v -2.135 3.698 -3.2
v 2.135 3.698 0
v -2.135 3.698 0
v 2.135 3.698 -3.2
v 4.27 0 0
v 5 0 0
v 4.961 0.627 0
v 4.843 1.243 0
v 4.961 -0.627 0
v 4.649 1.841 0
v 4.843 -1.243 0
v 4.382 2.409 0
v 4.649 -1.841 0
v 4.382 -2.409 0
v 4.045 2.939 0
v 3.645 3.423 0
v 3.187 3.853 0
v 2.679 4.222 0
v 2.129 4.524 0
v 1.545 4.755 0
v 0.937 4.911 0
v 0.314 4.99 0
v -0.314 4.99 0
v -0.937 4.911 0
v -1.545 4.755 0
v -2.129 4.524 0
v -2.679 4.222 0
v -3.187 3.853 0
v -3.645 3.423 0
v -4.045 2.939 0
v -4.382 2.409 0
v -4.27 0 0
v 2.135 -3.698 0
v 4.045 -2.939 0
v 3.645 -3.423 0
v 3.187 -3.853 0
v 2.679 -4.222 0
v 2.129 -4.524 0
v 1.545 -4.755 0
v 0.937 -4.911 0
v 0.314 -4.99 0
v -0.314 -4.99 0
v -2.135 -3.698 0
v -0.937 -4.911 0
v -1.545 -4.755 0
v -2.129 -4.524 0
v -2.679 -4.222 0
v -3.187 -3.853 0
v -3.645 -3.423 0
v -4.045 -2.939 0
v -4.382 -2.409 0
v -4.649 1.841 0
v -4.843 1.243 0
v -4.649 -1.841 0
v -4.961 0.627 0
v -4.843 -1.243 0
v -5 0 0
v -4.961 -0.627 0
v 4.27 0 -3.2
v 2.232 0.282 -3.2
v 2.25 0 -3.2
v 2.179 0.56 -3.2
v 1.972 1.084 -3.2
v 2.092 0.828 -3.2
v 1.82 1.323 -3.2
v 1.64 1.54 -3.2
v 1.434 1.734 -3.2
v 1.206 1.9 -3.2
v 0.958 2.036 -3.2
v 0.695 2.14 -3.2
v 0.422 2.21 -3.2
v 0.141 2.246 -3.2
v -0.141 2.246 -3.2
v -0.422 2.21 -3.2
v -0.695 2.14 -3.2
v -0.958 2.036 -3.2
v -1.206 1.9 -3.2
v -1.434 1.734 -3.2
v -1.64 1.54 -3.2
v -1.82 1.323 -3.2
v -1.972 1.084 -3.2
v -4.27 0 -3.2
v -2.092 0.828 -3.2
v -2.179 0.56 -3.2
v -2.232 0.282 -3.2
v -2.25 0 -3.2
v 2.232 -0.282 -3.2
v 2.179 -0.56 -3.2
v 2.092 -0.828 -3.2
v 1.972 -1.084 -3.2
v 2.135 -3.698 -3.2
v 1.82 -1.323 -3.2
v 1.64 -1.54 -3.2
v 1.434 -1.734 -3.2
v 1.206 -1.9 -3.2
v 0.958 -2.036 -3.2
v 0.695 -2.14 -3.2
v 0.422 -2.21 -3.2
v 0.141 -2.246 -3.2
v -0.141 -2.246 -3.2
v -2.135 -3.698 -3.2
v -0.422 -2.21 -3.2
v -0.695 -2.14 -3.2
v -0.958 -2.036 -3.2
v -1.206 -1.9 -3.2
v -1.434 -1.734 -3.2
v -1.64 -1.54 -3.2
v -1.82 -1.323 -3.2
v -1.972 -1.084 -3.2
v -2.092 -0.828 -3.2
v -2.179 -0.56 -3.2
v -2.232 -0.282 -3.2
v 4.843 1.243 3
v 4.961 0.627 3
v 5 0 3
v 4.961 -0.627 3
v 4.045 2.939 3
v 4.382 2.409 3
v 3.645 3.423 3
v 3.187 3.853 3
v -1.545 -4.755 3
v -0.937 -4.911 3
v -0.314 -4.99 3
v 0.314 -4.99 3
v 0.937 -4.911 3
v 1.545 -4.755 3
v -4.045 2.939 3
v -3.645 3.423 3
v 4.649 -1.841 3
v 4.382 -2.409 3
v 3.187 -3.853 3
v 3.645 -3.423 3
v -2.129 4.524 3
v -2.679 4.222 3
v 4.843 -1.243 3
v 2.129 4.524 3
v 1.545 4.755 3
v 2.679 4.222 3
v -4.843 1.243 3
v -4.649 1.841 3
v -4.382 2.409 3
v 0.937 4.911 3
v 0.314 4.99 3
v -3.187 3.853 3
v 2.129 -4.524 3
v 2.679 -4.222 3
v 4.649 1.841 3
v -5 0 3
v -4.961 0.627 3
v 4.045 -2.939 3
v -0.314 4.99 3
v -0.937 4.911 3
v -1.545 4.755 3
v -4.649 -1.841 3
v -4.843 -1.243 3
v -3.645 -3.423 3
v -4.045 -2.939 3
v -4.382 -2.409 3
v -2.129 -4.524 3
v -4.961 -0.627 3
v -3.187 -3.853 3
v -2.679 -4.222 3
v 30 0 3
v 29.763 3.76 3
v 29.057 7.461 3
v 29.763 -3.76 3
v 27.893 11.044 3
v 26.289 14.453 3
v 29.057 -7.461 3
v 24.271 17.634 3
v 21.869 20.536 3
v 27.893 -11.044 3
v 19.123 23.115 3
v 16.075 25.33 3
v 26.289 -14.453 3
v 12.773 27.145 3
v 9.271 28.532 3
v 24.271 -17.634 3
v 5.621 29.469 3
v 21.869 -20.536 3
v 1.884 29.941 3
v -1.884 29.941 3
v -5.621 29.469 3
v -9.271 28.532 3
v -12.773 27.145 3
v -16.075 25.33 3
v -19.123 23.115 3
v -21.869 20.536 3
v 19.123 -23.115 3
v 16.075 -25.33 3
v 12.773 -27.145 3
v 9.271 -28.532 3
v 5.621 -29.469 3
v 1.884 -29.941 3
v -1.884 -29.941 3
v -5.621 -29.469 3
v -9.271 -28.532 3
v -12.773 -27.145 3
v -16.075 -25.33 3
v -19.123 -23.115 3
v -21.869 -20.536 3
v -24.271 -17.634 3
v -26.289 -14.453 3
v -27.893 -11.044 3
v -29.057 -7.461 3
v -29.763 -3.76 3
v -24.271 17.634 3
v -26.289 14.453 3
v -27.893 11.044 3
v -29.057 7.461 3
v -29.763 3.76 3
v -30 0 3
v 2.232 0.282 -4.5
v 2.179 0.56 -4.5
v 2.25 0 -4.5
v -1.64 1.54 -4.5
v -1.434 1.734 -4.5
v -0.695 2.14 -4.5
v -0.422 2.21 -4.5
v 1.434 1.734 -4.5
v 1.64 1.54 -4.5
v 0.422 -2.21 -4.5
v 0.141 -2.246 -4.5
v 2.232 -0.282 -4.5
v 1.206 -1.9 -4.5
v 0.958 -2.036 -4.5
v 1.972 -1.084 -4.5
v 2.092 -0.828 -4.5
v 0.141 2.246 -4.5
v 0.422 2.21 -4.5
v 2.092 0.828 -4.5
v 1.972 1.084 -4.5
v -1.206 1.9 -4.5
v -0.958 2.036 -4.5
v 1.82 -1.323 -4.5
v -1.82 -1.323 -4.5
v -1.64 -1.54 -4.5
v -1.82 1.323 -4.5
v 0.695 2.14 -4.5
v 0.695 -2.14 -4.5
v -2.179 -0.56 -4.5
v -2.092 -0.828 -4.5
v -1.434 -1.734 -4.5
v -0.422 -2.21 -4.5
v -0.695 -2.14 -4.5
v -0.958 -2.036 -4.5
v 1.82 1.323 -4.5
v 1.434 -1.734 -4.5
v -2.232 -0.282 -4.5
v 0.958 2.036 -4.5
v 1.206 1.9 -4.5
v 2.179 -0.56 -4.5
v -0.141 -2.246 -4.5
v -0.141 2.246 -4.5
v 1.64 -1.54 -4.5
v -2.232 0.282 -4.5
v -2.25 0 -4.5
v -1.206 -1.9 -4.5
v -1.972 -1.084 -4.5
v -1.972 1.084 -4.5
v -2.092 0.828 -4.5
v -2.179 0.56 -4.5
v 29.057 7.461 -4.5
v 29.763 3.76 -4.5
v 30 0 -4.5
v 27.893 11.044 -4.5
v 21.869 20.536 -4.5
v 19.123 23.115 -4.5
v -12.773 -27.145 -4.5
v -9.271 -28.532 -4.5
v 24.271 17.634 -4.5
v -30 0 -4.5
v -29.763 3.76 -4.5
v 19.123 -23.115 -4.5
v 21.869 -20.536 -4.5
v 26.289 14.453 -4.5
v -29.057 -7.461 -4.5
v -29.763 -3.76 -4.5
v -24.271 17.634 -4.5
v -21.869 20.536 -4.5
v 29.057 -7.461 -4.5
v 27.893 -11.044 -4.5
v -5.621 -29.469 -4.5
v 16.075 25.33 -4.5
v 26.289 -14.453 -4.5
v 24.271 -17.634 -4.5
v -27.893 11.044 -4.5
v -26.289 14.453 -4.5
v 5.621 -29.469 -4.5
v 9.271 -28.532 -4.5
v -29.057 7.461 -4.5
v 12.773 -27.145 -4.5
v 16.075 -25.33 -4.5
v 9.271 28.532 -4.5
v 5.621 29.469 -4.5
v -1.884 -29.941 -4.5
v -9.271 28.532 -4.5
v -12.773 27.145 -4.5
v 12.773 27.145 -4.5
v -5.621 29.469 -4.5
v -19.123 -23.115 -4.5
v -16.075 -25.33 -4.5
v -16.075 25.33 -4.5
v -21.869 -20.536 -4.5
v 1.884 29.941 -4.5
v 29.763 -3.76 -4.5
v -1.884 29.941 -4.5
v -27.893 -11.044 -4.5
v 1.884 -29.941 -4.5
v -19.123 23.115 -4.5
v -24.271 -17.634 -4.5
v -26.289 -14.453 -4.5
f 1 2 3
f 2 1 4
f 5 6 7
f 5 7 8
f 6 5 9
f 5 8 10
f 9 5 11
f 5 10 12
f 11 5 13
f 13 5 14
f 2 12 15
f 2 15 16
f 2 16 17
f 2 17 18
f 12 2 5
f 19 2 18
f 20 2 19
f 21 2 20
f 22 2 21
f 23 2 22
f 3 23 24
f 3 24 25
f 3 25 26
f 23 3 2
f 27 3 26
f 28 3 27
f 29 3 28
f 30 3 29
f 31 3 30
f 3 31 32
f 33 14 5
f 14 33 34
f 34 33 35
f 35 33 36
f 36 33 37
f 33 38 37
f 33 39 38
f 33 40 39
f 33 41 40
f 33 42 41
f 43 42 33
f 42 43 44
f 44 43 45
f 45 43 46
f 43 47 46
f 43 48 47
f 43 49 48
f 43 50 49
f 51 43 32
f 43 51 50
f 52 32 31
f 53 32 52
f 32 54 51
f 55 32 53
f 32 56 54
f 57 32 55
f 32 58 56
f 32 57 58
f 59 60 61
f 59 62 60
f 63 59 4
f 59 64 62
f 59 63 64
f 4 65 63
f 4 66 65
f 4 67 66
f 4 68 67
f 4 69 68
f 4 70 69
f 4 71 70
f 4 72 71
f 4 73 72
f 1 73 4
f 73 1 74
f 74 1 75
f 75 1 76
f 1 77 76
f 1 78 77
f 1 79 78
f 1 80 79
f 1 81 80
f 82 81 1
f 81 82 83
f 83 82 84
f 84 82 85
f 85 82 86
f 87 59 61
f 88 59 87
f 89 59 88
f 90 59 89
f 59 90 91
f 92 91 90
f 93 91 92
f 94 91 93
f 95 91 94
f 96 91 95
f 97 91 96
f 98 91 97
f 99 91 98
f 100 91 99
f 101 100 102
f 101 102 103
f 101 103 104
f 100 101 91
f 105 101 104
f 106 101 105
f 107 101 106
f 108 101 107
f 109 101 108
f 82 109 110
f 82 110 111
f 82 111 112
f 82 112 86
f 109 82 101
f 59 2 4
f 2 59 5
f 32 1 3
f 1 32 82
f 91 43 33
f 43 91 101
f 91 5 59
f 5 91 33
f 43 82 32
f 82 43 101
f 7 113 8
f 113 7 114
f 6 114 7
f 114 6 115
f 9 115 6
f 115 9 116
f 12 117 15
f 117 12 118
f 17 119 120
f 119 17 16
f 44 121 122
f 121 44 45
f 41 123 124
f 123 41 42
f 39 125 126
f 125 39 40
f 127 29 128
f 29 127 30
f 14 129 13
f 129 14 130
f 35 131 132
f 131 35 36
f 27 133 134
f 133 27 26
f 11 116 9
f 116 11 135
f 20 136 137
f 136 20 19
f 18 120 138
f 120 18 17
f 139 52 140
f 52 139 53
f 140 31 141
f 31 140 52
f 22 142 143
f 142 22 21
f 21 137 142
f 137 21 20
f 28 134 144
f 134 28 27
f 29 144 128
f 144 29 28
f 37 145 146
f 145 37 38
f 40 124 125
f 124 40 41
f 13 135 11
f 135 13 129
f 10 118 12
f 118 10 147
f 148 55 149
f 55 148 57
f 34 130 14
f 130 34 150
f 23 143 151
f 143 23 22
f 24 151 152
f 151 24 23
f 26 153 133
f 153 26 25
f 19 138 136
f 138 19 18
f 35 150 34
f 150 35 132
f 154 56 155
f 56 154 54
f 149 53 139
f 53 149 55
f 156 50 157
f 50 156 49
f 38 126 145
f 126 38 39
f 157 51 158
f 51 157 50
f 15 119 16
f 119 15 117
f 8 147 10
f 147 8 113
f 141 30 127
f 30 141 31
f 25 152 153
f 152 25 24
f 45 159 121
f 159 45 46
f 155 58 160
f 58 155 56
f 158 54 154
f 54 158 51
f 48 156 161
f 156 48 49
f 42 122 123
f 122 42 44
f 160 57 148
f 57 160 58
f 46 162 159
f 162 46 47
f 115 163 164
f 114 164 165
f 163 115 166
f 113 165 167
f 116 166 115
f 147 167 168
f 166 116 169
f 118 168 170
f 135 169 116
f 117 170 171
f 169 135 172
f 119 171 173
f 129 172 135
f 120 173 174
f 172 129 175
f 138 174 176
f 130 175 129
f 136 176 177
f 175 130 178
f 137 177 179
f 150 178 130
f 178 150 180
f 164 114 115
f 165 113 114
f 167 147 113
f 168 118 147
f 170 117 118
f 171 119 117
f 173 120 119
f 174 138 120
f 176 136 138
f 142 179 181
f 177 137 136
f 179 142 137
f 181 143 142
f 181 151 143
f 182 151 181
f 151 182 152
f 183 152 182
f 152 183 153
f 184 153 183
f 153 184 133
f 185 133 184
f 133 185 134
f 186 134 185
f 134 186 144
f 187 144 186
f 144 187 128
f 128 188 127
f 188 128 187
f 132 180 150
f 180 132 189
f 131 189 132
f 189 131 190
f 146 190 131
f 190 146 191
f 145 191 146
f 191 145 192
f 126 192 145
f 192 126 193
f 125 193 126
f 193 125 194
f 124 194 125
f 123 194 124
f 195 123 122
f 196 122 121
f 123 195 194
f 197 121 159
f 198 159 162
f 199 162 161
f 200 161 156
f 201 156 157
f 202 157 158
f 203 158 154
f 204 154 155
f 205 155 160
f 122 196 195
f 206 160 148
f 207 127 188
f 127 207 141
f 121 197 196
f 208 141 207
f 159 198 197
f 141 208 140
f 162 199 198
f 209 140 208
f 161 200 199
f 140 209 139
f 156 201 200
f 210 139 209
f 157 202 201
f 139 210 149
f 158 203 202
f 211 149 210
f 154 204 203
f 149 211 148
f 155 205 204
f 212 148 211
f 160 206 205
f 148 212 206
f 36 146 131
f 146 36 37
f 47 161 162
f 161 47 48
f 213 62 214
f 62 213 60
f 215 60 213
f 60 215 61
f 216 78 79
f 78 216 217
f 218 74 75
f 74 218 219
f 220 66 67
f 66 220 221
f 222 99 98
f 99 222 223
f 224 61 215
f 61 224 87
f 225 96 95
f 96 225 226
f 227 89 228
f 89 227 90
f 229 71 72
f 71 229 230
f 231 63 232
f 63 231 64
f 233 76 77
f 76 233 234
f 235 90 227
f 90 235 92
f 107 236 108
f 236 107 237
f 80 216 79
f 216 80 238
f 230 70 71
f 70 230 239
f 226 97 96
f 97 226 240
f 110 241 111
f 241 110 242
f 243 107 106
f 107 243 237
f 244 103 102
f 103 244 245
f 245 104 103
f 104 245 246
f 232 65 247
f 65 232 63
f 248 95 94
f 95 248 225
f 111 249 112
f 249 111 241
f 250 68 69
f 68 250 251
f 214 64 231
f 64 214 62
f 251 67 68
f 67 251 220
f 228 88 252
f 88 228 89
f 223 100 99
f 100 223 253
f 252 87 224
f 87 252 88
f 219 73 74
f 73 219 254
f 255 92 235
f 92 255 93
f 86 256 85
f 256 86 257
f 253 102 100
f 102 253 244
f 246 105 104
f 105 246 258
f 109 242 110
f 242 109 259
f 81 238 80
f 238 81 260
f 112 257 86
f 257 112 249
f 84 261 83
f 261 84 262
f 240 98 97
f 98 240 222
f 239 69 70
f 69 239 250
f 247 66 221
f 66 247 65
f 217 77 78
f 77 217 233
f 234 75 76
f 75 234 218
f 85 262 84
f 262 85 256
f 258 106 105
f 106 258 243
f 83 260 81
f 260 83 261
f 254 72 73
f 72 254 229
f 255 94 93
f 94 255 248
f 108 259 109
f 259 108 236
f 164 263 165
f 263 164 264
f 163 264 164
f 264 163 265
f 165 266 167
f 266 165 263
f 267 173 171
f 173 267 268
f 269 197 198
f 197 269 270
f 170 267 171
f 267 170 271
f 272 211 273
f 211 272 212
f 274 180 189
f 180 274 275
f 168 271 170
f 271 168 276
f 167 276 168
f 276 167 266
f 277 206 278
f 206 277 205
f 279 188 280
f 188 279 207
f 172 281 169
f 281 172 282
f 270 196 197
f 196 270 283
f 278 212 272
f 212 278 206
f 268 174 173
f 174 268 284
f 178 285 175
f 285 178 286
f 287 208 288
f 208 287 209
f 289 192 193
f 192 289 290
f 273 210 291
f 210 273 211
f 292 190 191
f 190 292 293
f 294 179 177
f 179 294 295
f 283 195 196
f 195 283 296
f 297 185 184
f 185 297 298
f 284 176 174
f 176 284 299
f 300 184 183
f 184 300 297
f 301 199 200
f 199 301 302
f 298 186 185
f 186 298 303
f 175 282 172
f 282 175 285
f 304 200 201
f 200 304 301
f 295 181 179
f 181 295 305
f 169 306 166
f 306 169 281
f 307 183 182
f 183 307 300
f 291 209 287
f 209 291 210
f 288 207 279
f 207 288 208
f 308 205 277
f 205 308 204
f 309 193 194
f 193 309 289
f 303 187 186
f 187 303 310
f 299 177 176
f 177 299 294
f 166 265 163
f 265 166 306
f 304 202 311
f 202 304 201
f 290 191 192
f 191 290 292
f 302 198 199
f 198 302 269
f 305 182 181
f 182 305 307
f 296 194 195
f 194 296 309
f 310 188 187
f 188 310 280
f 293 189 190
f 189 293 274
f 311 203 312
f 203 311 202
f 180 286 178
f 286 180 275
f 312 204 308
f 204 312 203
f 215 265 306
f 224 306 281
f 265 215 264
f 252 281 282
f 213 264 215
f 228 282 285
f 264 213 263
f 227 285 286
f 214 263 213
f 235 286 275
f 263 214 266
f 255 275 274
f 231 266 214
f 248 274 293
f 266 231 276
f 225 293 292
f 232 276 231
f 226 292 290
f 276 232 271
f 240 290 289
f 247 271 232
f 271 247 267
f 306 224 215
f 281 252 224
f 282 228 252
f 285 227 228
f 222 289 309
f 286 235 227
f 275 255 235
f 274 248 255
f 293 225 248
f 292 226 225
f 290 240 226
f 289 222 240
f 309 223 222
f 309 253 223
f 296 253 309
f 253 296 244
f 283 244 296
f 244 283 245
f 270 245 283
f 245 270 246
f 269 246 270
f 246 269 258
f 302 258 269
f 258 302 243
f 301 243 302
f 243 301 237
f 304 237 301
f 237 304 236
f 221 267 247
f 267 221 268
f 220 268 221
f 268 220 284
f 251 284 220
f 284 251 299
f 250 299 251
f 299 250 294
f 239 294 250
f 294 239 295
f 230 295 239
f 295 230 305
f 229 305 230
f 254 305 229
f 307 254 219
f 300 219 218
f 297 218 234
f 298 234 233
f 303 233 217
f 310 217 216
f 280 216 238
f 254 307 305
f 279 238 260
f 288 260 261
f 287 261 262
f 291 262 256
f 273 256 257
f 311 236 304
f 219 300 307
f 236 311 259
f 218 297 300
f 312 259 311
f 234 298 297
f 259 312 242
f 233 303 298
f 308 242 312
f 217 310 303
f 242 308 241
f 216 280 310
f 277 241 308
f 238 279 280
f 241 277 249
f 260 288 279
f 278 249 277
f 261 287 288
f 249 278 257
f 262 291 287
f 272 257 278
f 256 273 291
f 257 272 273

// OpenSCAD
$fn = 50;


difference() {
	union() {
		translate(v = [0, 0, -4.5000000000]) {
			cylinder(h = 7.5000000000, r = 30.0000000000);
		}
	}
	union() {
		translate(v = [0, 0, 0]) {
			rotate(a = [0, 0, 0]) {
				difference() {
					union() {
						translate(v = [0, 0, -3.2000000000]) {
							linear_extrude(height = 3.2000000000) {
								polygon(points = [[4.2698000000, 0.0000000000], [2.1349000000, 3.6977552691], [-2.1349000000, 3.6977552691], [-4.2698000000, 0.0000000000], [-2.1349000000, -3.6977552691], [2.1349000000, -3.6977552691]]);
							}
						}
					}
					union();
				}
			}
		}
		#cylinder(h = 3, r = 5.0000000000);
		#translate(v = [0, 0, -100.0000000000]) {
			cylinder(h = 200, r = 2.2500000000);
		}
	}
}
